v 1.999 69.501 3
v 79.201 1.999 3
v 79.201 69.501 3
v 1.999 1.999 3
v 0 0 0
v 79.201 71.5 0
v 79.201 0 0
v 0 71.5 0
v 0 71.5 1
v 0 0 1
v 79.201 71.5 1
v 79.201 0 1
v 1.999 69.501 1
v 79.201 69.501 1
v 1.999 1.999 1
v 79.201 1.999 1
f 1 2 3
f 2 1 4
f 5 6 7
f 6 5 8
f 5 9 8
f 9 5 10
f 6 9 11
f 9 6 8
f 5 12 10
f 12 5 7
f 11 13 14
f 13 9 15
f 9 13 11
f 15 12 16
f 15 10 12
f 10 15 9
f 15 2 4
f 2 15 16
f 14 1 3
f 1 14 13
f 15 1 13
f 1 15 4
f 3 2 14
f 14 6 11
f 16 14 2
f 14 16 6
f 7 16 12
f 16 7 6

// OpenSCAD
wallThickness = 3.0;
boardLength = 96.4;
boardWidth = 65.5;
boardHeight = 15.0;
leadProtrusion = 5.0;
lidHeight = 3.0;
lidCutout = 20.2;
boardLip = 2.0;
lidLip = 2.0;
lidLipHeight = 2.0;
lidCutaway = 20.2;
batteryLength = 70.0;
batteryWidth = 60.2;
batteryHeight = 9.0;
barrelJackOffset = 18.9;
barrelJackWidth = 10.0;
barrelJackHeight = 10.9;
pcbThickness = 2.5;
usbCOffset = 6.1;
usbCWidth = 9.1;
usbCHeight = 3.5;
usbCHeightOffset = 3.7;

showCase = false;
showLid = true;

lidHoverHeight = 20.0;

delta = 0.001;

overallHeight = boardHeight + leadProtrusion + batteryHeight + wallThickness + lidHeight;
pcbSurfaceHeight = wallThickness + pcbThickness + batteryHeight + leadProtrusion;

lidBaseHeight = showLid && !showCase ? 0 : overallHeight + lidHeight + lidHoverHeight;

// case
if (showCase) difference() {
    // base cube
    cube([boardLength + 2*wallThickness, boardWidth + 2*wallThickness, overallHeight]);
    // lid
    translate([wallThickness - lidLip, wallThickness - lidLip, overallHeight - lidHeight]) cube([boardLength + 2*lidLip, boardWidth + 2*lidLip, lidHeight + delta]);
    // pcb area
    translate([wallThickness, wallThickness, overallHeight - lidHeight - boardHeight]) cube([boardLength, boardWidth, boardHeight + delta]);
    // battery area
    translate([(boardLength - batteryLength) / 2 + wallThickness, (boardWidth - batteryWidth) / 2 + wallThickness, wallThickness]) cube([batteryLength, batteryWidth, batteryHeight + leadProtrusion + delta]);
    // barrel jack cutout
    translate([0 - delta, wallThickness + barrelJackOffset, pcbSurfaceHeight]) cube([wallThickness + 2*delta, barrelJackWidth, barrelJackHeight + delta]); 
    // USB-C port cutout
    translate([usbCOffset, wallThickness + boardWidth - delta, pcbSurfaceHeight + usbCHeightOffset]) cube([usbCWidth, wallThickness + 2*delta, usbCHeight]);
}

// lid
if (showLid) translate([0, 0, lidBaseHeight]) difference() {
    // base area
    cube([boardLength + 2*wallThickness, boardWidth + 2*wallThickness, lidHeight]);
    // edges to fit into case
    translate([0 - delta, 0 - delta, lidHeight - lidLipHeight]) cube([boardLength + 2*wallThickness + 2*delta, lidLip, lidLipHeight + delta]);
    translate([0 - delta, boardWidth + 2*wallThickness - lidLip + delta, lidHeight - lidLipHeight]) cube([boardLength + 2*wallThickness + 2*delta, lidLip, lidLipHeight + delta]);
    translate([0 - delta, 0 - delta, lidHeight - lidLipHeight]) cube([lidLip, boardWidth + 2*wallThickness + 2*delta, lidLipHeight + delta]);
    translate([boardLength + 2*wallThickness - lidLip + delta, 0 - delta, lidHeight - lidLipHeight]) cube([lidLip, boardWidth + 2*wallThickness + 2*delta, lidLipHeight + delta]);
    // cutaway for access to ports
    translate([boardLength + wallThickness - lidCutaway + delta, 0 - delta, 0 - delta]) cube([lidCutaway + wallThickness + delta, boardWidth + 2*wallThickness + 2*delta, lidHeight + 2*delta]);
}
